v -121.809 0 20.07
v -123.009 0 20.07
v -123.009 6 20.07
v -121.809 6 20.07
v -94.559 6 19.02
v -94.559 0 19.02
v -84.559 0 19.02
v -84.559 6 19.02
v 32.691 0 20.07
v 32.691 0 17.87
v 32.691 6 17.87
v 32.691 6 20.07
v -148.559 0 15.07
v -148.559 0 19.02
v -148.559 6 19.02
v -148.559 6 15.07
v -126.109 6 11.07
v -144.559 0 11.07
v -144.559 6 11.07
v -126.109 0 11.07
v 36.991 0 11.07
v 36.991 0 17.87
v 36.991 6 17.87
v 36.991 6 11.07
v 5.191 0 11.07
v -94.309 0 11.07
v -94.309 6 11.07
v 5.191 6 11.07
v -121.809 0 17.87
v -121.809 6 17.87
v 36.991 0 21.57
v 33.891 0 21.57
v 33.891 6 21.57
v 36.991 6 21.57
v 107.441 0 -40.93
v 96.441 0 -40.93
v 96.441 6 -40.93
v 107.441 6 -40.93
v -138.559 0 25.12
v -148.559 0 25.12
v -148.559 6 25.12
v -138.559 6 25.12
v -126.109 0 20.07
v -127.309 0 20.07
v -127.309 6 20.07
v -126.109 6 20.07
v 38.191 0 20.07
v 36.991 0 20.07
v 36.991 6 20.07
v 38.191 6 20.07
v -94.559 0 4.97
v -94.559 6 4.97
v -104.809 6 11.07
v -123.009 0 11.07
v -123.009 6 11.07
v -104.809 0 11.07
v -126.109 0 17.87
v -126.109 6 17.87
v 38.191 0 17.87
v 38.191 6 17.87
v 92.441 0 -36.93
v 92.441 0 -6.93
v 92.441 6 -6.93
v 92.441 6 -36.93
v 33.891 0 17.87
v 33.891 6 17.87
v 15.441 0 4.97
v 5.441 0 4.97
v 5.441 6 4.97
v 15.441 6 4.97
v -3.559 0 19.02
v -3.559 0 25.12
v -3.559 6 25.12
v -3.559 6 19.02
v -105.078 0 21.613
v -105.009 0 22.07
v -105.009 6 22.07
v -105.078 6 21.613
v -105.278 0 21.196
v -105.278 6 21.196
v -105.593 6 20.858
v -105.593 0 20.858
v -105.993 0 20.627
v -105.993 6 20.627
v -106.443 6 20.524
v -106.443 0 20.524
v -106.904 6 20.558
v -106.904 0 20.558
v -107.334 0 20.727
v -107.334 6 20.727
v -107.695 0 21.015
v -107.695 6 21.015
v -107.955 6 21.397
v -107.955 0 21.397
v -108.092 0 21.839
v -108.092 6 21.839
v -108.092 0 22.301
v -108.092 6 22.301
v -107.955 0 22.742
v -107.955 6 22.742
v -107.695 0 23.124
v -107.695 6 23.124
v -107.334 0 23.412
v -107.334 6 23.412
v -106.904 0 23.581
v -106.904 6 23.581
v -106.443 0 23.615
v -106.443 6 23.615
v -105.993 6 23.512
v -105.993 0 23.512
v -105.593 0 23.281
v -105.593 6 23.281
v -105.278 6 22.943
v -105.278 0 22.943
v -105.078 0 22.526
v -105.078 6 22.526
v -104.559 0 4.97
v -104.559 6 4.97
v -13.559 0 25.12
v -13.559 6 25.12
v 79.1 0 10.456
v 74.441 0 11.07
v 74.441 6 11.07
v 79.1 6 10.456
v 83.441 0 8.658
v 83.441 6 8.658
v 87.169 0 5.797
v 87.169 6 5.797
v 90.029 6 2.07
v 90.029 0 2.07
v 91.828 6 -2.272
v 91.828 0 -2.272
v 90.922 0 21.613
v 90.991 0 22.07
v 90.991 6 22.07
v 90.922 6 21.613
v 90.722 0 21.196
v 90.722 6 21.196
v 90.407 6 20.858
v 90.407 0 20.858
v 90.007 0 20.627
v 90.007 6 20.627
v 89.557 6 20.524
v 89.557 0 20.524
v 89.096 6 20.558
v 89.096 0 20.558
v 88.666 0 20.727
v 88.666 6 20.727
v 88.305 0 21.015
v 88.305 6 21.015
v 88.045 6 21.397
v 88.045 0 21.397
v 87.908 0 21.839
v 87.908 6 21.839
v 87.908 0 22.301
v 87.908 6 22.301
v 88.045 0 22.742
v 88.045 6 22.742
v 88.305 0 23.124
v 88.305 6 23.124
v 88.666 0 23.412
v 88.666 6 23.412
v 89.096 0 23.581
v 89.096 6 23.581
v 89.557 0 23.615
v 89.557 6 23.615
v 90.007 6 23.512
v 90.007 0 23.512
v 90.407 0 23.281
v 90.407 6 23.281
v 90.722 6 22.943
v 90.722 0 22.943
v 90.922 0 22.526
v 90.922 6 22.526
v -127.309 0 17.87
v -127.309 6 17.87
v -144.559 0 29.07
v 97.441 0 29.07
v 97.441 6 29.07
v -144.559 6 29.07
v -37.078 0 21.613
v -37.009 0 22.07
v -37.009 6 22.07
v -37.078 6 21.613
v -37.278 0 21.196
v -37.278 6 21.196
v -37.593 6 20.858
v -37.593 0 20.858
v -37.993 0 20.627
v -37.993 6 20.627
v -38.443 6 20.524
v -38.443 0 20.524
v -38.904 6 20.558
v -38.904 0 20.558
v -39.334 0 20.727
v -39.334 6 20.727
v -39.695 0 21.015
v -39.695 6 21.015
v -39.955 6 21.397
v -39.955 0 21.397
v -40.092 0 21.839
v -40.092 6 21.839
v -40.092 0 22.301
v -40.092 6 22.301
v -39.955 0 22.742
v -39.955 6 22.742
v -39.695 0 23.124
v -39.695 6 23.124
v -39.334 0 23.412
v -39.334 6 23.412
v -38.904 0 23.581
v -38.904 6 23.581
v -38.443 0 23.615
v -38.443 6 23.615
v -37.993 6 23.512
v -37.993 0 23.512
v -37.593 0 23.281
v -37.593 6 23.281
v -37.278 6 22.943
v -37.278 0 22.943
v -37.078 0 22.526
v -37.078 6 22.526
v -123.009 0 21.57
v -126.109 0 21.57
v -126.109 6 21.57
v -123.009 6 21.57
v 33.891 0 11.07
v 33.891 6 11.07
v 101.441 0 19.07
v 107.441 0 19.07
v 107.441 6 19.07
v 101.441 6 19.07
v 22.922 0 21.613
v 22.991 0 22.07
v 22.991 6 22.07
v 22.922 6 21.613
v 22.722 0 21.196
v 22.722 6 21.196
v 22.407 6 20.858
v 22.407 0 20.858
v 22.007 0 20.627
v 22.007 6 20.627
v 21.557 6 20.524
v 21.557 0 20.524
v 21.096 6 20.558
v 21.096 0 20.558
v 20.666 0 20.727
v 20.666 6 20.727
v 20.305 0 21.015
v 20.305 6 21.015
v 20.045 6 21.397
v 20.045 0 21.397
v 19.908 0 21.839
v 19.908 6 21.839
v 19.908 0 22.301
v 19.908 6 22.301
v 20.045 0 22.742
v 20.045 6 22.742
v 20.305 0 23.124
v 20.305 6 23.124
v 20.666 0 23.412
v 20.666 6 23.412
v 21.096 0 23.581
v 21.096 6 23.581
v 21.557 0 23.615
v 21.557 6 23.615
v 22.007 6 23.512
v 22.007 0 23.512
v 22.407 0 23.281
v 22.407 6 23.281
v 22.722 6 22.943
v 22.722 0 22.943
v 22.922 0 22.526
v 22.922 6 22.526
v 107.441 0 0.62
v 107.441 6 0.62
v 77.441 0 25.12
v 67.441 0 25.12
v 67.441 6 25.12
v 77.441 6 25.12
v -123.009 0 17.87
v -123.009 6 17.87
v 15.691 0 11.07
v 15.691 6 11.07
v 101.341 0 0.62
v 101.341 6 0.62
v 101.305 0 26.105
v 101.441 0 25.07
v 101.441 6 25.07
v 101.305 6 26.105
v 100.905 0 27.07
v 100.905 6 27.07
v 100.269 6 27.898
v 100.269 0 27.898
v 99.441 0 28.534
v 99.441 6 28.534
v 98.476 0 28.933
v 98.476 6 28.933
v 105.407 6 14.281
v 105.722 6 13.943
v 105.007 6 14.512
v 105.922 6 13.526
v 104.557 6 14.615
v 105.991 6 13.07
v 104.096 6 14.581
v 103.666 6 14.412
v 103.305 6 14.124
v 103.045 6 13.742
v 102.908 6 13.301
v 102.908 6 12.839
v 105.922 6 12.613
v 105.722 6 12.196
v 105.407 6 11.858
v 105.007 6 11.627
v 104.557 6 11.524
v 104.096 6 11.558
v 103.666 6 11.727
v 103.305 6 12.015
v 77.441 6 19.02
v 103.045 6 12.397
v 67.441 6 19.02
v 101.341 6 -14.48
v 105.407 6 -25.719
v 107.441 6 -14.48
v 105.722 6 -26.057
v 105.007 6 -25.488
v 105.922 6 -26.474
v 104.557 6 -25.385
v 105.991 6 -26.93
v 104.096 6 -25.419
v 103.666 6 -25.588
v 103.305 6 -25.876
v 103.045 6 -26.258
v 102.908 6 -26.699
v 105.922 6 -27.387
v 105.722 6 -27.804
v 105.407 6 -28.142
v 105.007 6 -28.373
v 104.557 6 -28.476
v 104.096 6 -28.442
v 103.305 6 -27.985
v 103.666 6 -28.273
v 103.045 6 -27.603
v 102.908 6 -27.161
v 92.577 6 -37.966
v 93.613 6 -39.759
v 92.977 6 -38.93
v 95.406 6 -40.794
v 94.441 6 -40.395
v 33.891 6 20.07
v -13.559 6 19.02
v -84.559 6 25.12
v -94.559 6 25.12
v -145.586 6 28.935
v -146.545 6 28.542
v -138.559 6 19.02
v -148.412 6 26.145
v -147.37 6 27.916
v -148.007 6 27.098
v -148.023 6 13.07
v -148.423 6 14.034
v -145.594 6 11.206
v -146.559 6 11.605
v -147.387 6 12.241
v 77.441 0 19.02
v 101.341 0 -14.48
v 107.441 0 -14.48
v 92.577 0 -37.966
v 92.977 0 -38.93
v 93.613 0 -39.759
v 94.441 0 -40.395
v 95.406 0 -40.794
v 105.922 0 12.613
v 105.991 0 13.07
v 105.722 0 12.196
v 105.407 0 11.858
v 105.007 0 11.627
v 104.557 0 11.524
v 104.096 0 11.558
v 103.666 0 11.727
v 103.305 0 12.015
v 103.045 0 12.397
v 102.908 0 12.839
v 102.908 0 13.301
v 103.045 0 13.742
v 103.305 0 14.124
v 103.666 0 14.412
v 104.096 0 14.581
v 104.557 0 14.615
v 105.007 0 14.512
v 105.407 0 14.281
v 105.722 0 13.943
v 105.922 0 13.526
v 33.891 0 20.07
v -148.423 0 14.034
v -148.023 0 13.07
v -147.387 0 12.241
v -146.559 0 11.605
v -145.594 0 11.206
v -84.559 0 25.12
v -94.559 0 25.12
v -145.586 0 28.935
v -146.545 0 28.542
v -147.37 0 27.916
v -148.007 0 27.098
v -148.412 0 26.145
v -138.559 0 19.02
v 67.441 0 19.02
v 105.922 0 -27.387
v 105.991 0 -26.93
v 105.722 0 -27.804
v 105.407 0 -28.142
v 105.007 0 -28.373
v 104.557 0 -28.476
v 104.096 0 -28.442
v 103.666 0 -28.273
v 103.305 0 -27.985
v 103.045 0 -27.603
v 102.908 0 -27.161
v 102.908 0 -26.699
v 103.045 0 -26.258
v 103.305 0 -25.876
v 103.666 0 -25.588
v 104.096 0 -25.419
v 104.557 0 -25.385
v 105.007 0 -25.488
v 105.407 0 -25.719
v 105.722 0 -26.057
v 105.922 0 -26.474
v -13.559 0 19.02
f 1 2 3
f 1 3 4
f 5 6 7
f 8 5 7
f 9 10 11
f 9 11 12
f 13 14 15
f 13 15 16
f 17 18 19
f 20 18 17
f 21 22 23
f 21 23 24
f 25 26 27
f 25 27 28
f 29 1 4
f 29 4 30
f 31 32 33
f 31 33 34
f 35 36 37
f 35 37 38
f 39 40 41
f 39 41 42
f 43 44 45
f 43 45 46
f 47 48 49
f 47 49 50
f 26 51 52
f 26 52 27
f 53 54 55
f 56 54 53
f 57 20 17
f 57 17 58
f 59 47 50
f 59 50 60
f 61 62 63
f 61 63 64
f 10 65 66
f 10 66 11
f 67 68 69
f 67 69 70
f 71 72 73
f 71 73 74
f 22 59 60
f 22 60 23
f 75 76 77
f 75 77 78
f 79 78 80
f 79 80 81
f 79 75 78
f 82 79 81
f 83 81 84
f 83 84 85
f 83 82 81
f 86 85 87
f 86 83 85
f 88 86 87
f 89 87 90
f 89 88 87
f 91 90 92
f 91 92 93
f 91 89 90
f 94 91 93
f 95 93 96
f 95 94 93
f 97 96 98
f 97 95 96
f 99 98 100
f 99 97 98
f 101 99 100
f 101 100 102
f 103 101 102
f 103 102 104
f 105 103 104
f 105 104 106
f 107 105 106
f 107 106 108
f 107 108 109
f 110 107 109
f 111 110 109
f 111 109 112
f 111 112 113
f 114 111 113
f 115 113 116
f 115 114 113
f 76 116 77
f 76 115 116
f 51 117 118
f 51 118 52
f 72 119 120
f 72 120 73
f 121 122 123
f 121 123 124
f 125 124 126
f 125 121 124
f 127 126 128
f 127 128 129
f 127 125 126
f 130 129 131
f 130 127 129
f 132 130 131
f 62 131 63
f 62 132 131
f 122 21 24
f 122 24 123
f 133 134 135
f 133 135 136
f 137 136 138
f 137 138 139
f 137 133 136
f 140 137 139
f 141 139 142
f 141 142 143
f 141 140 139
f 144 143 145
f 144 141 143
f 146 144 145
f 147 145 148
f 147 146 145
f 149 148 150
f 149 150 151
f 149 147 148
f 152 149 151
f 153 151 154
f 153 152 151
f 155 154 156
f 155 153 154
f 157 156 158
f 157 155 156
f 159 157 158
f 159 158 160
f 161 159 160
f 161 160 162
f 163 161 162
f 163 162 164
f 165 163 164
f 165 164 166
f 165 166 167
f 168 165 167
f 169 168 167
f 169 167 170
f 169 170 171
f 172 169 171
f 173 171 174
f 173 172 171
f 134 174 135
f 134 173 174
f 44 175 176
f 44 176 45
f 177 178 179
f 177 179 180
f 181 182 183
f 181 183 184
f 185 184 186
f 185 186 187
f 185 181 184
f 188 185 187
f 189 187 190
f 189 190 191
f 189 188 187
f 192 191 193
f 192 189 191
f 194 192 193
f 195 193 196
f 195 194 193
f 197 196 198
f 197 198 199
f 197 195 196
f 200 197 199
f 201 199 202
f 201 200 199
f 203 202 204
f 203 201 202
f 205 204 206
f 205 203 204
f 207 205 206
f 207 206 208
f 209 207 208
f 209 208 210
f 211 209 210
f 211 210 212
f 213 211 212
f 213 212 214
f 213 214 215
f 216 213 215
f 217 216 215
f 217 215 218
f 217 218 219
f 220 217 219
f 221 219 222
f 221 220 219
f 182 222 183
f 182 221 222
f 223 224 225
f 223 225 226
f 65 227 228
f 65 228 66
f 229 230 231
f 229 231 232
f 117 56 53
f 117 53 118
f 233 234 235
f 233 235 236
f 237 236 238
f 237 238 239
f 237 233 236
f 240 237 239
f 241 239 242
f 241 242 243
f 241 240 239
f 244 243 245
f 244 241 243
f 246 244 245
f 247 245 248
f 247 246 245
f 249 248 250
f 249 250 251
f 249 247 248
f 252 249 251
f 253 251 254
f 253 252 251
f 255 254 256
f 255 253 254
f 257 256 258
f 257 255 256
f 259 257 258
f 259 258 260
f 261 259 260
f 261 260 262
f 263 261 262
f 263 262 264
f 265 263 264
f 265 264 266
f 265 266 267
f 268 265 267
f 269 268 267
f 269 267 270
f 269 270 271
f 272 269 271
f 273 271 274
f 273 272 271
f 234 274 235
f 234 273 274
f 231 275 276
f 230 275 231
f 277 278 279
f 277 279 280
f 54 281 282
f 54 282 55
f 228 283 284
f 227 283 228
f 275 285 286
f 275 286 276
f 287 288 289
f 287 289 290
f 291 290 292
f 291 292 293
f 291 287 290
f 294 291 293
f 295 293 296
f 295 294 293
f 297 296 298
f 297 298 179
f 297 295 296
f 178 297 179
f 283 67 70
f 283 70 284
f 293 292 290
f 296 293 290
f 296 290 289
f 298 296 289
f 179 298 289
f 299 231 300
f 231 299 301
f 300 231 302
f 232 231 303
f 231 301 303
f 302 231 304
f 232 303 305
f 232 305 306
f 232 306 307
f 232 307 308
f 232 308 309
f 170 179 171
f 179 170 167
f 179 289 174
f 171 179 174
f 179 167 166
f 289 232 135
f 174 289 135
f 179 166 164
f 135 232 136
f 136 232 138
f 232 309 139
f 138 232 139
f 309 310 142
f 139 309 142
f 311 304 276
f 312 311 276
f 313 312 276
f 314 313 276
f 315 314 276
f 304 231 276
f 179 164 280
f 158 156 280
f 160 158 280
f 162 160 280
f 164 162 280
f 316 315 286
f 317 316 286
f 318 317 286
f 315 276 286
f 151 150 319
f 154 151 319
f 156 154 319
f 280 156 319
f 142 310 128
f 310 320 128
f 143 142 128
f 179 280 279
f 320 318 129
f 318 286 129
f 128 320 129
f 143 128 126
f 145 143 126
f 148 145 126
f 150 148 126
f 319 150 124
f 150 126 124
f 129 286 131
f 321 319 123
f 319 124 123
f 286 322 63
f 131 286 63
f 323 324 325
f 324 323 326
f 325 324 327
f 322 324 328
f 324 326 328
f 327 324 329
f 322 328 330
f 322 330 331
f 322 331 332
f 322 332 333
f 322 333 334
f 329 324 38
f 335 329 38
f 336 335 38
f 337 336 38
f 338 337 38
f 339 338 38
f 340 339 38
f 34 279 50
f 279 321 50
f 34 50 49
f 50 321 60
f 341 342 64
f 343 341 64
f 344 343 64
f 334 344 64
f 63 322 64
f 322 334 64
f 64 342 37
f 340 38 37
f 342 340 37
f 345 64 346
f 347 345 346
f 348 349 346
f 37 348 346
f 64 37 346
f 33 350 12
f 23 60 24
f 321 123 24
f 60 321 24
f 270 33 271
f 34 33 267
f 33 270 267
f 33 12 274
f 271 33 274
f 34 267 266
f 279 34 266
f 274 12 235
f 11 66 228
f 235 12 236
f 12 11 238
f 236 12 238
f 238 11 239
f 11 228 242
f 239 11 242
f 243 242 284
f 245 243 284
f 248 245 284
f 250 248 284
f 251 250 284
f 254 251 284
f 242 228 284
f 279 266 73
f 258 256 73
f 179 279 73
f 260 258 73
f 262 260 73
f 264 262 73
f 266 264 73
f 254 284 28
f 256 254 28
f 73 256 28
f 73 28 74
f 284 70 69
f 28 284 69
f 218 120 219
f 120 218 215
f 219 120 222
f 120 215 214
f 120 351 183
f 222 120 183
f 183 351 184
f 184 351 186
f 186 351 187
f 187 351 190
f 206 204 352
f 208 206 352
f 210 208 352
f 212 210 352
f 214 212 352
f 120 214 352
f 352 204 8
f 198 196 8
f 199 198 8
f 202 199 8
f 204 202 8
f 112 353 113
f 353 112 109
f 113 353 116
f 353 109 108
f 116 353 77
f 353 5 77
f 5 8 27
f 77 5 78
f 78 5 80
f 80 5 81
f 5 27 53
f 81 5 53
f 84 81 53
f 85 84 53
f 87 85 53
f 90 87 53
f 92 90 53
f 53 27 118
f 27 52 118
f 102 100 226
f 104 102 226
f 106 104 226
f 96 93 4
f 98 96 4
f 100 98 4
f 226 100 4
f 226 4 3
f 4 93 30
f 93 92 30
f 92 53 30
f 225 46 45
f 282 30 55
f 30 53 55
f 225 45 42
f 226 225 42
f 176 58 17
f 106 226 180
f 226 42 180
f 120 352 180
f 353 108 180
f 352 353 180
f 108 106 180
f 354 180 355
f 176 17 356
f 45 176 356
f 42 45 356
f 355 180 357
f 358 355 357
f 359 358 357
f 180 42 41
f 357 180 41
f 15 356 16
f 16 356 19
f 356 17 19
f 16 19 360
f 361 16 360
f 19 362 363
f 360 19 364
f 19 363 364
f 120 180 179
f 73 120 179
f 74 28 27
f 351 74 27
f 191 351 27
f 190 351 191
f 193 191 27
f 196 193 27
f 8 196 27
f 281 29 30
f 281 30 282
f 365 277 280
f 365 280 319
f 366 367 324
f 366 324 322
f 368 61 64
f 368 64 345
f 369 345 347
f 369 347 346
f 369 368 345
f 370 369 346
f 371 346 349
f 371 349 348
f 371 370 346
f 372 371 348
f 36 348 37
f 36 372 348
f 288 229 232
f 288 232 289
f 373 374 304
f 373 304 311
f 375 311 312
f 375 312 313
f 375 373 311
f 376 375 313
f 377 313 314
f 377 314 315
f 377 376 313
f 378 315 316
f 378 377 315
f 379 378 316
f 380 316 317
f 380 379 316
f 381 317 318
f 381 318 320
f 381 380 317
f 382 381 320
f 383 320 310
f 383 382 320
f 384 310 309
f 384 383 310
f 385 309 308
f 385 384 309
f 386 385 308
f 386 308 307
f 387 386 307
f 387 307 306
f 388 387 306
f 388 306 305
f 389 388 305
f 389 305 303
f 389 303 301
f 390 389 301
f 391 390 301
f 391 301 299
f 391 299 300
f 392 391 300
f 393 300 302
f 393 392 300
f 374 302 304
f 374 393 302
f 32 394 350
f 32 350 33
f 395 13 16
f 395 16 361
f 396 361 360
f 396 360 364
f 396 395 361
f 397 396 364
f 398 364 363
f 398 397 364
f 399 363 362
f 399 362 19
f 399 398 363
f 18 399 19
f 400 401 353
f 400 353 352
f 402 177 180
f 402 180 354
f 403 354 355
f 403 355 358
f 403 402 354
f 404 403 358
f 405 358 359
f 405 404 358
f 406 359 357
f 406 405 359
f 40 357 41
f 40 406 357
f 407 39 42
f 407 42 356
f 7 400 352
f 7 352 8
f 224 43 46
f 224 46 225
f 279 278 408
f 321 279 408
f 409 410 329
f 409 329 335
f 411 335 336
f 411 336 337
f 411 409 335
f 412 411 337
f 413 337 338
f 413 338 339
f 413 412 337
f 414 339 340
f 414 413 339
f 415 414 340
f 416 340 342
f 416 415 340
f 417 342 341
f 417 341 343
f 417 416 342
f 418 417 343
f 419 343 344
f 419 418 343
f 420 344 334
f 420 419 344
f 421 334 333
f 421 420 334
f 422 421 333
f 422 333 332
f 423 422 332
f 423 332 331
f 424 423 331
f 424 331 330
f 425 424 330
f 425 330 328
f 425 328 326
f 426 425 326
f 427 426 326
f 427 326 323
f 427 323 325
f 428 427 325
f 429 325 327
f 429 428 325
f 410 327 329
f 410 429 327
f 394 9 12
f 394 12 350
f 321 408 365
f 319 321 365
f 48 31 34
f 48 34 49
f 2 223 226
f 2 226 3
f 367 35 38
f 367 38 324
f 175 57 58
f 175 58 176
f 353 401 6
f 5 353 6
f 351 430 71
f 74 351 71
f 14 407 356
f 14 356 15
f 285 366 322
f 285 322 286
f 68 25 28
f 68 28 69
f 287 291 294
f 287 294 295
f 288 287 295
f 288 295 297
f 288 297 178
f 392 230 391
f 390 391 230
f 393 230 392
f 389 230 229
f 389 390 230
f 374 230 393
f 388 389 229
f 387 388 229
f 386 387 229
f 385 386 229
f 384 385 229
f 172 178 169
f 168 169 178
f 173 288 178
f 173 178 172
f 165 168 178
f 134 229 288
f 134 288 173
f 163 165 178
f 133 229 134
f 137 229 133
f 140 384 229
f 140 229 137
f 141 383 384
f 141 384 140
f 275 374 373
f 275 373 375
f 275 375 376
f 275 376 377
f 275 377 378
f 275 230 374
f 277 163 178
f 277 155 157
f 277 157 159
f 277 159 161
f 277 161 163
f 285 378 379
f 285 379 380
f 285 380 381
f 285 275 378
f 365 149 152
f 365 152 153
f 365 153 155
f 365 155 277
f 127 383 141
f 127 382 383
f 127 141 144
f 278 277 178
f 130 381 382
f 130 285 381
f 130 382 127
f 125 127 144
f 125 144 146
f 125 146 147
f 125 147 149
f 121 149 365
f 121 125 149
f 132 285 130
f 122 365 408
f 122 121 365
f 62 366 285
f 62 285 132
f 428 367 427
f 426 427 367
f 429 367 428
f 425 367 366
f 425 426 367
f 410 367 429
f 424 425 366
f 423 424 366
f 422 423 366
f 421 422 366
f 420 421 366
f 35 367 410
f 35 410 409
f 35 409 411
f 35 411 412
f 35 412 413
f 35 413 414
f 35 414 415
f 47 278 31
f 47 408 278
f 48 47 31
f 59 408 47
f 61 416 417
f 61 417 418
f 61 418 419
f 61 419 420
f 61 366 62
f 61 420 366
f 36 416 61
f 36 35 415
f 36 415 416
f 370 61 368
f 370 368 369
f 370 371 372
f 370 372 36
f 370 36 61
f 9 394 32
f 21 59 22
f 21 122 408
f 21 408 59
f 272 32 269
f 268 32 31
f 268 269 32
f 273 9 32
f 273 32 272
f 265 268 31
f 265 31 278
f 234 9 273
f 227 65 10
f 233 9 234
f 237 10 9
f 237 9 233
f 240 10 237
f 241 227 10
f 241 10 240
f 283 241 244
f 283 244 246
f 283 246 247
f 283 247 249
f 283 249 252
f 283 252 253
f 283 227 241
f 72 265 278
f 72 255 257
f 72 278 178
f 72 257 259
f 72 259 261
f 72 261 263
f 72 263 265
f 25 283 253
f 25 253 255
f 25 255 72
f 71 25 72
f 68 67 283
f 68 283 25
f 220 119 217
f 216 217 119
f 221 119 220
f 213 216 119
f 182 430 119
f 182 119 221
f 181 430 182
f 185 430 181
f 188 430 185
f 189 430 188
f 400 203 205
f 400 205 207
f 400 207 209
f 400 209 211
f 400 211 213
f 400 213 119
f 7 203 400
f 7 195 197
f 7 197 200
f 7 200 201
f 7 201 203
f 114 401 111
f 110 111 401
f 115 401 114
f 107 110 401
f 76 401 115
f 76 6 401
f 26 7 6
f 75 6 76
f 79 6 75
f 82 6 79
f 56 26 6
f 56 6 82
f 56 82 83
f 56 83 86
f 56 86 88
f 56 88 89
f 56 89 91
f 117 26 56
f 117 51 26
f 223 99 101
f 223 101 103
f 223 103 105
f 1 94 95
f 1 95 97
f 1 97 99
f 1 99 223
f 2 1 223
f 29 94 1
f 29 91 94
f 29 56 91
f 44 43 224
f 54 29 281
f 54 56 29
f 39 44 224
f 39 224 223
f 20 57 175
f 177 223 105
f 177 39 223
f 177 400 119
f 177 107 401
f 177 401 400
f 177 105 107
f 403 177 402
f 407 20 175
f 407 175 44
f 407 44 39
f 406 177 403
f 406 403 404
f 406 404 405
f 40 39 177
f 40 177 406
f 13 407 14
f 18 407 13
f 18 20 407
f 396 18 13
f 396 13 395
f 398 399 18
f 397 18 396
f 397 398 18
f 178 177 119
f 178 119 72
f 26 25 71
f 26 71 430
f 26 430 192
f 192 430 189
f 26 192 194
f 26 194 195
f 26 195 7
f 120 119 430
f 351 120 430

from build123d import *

# Parameters (mm, degrees)
SKETCH_1_R      = 1.55
SKETCH_1_W      = 10
SKETCH_1_H      = 6.1
EXTRUDE_1_DEPTH = 6


with BuildPart() as part:
    # Эскиз1 → Бобышка-Вытянуть1 (new body)
    with BuildSketch(Plane(origin=(0, 0, 0), x_dir=(1, 0, 0), z_dir=(0, 1, 0))):
        with BuildLine():
            Line((33.891038961, -17.86953047), (32.691038961, -17.86953047))
            Line((32.691038961, -17.86953047), (32.691038961, -20.06953047))
            Line((32.691038961, -20.06953047), (33.891038961, -20.06953047))
            Line((33.891038961, -20.06953047), (33.891038961, -21.56953047))
            Line((33.891038961, -21.56953047), (36.991038961, -21.56953047))
            Line((36.991038961, -21.56953047), (36.991038961, -20.06953047))
            Line((36.991038961, -20.06953047), (38.191038961, -20.06953047))
            Line((38.191038961, -20.06953047), (38.191038961, -17.86953047))
            Line((38.191038961, -17.86953047), (36.991038961, -17.86953047))
            Line((36.991038961, -17.86953047), (36.991038961, -11.06953047))
            Line((36.991038961, -11.06953047), (74.441038961, -11.06953047))
            ThreePointArc((74.441038961, -11.06953047), (87.168961022, -5.797452531), (92.441038961, 6.93046953))
            Line((92.441038961, 6.93046953), (92.441038961, 36.93046953))
            ThreePointArc((92.441038961, 36.93046953), (93.612611836, 39.758896655), (96.441038961, 40.93046953))
            Line((96.441038961, 40.93046953), (107.441038961, 40.93046953))
            Line((107.441038961, 40.93046953), (107.441038961, 14.48046953))
            Line((107.441038961, 14.48046953), (101.341038961, 14.48046953))
            Line((101.341038961, 14.48046953), (101.341038961, -0.61953047))
            Line((101.341038961, -0.61953047), (107.441038961, -0.61953047))
            Line((107.441038961, -0.61953047), (107.441038961, -19.06953047))
            Line((107.441038961, -19.06953047), (101.441038961, -19.06953047))
            Line((101.441038961, -19.06953047), (101.441038961, -25.06953047))
            ThreePointArc((101.441038961, -25.06953047), (100.269466086, -27.897957594), (97.441038961, -29.06953047))
            Line((97.441038961, -29.06953047), (-144.559273551, -29.06953047))
            ThreePointArc((-144.559273551, -29.06953047), (-147.369967416, -27.915580364), (-148.558961039, -25.11953047))
            Line((-148.558961039, -25.11953047), (-138.558961039, -25.11953047))
            Line((-138.558961039, -25.11953047), (-138.558961039, -19.01953047))
            Line((-138.558961039, -19.01953047), (-148.558961039, -19.01953047))
            Line((-148.558961039, -19.01953047), (-148.558961039, -15.06953047))
            ThreePointArc((-148.558961039, -15.06953047), (-147.387388164, -12.241103345), (-144.558961039, -11.06953047))
            Line((-144.558961039, -11.06953047), (-126.108961039, -11.06953047))
            Line((-126.108961039, -11.06953047), (-126.108961039, -17.86953047))
            Line((-126.108961039, -17.86953047), (-127.308961039, -17.86953047))
            Line((-127.308961039, -17.86953047), (-127.308961039, -20.06953047))
            Line((-127.308961039, -20.06953047), (-126.108961039, -20.06953047))
            Line((-126.108961039, -20.06953047), (-126.108961039, -21.56953047))
            Line((-126.108961039, -21.56953047), (-123.008961039, -21.56953047))
            Line((-123.008961039, -21.56953047), (-123.008961039, -20.06953047))
            Line((-123.008961039, -20.06953047), (-121.808961039, -20.06953047))
            Line((-121.808961039, -20.06953047), (-121.808961039, -17.86953047))
            Line((-121.808961039, -17.86953047), (-123.008961039, -17.86953047))
            Line((-123.008961039, -17.86953047), (-123.008961039, -11.06953047))
            Line((-123.008961039, -11.06953047), (-104.808961039, -11.06953047))
            Line((-104.808961039, -11.06953047), (-104.558961039, -4.96953047))
            Line((-104.558961039, -4.96953047), (-94.558961039, -4.96953047))
            Line((-94.558961039, -4.96953047), (-94.308961039, -11.06953047))
            Line((-94.308961039, -11.06953047), (5.191038961, -11.06953047))
            Line((5.191038961, -11.06953047), (5.441038961, -4.96953047))
            Line((5.441038961, -4.96953047), (15.441038961, -4.96953047))
            Line((15.441038961, -4.96953047), (15.691038961, -11.06953047))
            Line((15.691038961, -11.06953047), (33.891038961, -11.06953047))
            Line((33.891038961, -11.06953047), (33.891038961, -17.86953047))
        make_face()
        with Locations((104.441038961, 26.93046953)):
            Circle(SKETCH_1_R, mode=Mode.SUBTRACT)
        with Locations((104.441038961, -13.06953047)):
            Circle(SKETCH_1_R, mode=Mode.SUBTRACT)
        with Locations((-106.558961039, -22.06953047)):
            Circle(SKETCH_1_R, mode=Mode.SUBTRACT)
        with Locations((-38.558961039, -22.06953047)):
            Circle(SKETCH_1_R, mode=Mode.SUBTRACT)
        with Locations((21.441038961, -22.06953047)):
            Circle(SKETCH_1_R, mode=Mode.SUBTRACT)
        with Locations((89.441038961, -22.06953047)):
            Circle(SKETCH_1_R, mode=Mode.SUBTRACT)
        with Locations((-89.558961039, -22.06953047)):
            Rectangle(SKETCH_1_W, SKETCH_1_H, mode=Mode.SUBTRACT)
        with Locations((72.441038961, -22.06953047)):
            Rectangle(SKETCH_1_W, SKETCH_1_H, mode=Mode.SUBTRACT)
        with Locations((-8.558961039, -22.06953047)):
            Rectangle(SKETCH_1_W, SKETCH_1_H, mode=Mode.SUBTRACT)
    extrude(amount=EXTRUDE_1_DEPTH)


solid = part.part
